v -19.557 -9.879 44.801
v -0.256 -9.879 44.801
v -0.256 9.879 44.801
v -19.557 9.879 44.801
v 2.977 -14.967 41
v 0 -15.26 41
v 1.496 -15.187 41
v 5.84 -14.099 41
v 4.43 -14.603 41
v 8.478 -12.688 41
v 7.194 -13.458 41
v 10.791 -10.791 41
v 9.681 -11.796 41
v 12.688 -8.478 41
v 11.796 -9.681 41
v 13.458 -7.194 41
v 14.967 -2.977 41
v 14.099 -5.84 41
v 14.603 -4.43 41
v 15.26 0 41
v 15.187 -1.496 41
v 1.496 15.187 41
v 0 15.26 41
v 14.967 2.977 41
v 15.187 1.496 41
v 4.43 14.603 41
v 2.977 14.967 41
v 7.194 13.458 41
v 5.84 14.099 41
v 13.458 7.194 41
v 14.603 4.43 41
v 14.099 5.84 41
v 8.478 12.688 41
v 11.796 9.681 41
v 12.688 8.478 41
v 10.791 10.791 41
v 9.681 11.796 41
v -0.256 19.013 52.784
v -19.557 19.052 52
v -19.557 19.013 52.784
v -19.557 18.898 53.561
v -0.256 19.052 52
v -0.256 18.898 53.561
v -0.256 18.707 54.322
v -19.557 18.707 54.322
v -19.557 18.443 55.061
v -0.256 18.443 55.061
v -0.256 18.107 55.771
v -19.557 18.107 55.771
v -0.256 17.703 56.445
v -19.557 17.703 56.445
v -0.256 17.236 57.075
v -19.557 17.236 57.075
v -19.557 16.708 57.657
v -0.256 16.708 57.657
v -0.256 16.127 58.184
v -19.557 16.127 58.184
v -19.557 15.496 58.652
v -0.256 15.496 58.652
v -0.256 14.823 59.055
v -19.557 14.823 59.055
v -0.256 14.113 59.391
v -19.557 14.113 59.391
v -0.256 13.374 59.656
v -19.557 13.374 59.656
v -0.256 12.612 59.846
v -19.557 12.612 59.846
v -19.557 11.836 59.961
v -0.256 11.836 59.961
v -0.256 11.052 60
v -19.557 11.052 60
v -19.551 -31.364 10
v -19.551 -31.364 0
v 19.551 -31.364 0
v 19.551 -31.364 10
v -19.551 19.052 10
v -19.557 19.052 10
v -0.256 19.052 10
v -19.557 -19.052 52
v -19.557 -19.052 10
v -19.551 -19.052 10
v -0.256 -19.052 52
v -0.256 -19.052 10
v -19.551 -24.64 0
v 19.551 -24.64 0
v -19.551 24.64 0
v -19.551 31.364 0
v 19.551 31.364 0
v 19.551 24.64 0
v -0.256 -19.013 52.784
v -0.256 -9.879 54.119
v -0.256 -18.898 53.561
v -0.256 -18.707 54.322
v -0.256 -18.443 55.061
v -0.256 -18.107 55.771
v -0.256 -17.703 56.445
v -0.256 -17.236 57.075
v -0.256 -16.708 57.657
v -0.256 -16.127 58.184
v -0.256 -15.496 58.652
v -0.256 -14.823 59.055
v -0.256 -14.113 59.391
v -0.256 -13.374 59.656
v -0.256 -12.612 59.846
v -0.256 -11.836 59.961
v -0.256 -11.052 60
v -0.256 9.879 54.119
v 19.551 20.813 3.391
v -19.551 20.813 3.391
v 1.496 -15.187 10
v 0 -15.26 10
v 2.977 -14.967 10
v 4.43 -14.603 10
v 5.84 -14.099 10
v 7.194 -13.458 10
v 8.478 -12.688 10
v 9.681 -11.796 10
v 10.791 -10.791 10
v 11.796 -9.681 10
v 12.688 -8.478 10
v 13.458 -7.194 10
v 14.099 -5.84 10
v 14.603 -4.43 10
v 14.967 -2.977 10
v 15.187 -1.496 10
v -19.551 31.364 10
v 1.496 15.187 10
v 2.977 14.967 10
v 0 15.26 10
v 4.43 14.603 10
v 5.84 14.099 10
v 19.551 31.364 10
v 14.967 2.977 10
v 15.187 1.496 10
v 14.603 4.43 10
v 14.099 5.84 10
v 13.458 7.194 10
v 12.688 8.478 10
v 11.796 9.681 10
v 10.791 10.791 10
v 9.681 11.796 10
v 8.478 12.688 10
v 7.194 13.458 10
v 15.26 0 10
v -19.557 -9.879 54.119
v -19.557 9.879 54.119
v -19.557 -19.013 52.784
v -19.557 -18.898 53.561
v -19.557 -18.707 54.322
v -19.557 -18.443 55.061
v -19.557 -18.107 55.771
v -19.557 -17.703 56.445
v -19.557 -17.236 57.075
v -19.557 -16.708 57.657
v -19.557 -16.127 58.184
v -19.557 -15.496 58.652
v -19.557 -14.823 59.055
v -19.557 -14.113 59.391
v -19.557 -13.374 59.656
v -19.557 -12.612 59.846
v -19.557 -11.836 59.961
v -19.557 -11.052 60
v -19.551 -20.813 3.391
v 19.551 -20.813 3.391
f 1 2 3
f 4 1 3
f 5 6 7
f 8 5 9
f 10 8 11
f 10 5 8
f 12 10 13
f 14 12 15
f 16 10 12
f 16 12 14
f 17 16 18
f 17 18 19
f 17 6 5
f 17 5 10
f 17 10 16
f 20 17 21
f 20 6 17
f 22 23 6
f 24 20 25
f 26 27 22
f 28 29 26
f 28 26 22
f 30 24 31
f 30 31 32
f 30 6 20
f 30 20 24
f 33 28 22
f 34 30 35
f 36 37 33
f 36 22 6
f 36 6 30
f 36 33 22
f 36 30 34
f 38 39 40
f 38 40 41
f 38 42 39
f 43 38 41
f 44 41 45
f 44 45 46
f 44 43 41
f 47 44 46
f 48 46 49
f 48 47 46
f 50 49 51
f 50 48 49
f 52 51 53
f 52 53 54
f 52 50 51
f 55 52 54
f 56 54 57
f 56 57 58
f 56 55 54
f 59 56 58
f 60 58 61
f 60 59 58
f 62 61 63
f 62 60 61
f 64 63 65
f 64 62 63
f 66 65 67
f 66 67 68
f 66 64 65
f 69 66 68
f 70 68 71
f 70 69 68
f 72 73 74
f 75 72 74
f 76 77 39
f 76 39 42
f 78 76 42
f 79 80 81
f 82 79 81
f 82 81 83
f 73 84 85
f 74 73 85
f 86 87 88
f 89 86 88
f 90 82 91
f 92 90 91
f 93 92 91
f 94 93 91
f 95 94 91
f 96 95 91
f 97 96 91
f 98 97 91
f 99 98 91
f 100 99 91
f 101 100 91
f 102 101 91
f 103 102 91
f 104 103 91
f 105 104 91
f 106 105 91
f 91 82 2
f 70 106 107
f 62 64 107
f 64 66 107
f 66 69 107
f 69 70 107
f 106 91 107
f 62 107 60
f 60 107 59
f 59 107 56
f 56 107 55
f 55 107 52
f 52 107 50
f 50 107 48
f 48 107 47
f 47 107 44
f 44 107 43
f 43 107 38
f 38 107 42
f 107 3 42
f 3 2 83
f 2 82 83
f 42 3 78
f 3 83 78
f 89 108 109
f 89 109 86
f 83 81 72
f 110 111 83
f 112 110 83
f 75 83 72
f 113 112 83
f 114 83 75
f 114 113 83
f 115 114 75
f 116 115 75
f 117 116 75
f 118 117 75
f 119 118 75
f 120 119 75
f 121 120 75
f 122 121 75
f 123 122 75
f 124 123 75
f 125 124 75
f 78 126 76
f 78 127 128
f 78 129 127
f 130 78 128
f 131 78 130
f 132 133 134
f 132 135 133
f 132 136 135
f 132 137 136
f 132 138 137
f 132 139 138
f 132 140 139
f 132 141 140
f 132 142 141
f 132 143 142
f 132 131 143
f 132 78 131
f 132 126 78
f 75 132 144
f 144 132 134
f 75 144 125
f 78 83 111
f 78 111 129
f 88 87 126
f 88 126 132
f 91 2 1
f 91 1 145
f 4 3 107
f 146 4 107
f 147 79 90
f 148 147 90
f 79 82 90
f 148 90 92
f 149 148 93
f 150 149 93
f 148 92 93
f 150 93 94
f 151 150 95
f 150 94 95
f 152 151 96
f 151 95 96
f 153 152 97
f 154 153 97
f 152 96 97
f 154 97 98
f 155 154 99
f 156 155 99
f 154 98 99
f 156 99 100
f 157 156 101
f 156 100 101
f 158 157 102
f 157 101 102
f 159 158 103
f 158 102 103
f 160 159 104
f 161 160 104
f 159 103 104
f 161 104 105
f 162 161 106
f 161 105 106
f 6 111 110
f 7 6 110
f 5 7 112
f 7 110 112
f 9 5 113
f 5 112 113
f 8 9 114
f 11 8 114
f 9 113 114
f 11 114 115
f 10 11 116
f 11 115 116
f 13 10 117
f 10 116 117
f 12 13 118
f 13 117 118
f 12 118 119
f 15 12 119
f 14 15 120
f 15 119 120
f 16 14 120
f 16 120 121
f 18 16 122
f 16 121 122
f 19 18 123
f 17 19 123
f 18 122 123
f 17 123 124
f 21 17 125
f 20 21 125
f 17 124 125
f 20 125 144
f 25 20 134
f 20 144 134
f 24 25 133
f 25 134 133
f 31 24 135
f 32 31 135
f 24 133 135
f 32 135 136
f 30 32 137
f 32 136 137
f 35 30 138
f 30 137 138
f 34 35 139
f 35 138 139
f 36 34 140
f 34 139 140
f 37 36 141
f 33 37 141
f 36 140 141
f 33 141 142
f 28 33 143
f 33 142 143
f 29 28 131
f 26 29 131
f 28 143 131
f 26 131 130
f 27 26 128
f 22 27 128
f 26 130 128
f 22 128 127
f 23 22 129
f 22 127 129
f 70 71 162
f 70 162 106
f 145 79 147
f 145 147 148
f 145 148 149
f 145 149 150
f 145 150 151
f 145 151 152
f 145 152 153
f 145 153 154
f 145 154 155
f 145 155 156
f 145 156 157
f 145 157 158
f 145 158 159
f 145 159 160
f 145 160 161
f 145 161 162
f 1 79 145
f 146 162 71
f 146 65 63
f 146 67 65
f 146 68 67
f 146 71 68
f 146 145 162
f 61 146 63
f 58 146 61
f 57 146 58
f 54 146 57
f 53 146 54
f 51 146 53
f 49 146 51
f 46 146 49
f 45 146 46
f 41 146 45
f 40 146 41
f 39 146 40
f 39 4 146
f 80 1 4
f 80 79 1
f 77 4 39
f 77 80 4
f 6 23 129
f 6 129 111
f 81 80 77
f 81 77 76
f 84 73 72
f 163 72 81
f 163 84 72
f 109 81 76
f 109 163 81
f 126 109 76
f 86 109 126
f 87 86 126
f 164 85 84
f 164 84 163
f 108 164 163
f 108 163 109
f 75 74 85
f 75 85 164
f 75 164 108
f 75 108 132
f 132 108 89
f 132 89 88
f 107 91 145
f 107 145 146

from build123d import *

# Parameters (mm, degrees)
SKETCH_W        = 39.101506
SKETCH_H        = 62.728786
PAD_DEPTH       = 10
POCKET_DEPTH    = 39.102506
SKETCH002_W     = 19.301168
SKETCH002_H     = 38.103164
PAD001_DEPTH    = 50
FILLET_R        = 8
PAD002_DEPTH    = 31
SKETCH004_W     = 19.757324
SKETCH004_H     = 9.317804
POCKET001_DEPTH = 19.302168


with BuildPart() as part:
    # Sketch → Pad (new body)
    with BuildSketch(Plane.XY):
        Rectangle(SKETCH_W, SKETCH_H)
    extrude(amount=PAD_DEPTH)

    # Sketch001 (on Face3 of Pad) → Pocket (cut, through all)
    with BuildSketch(Plane.YZ.offset(19.550753)):
        Polygon((-24.639747, 0), (-20.812978, 3.391465), (20.812978, 3.391465), (24.639747, 0), align=None)
    extrude(amount=-POCKET_DEPTH, mode=Mode.SUBTRACT)

    # Sketch002 (on Face8 of Pocket) → Pad001 (join)
    with BuildSketch(Plane.XY.offset(10)):
        with Locations((-9.90619, 0)):
            Rectangle(SKETCH002_W, SKETCH002_H)
    extrude(amount=PAD001_DEPTH)

    # Fillet
    fillet_edges = [part.edges().sort_by_distance(p)[0] for p in [
        (-9.90619, -19.051582, 60),
        (-9.90619, 19.051582, 60),
    ]]
    fillet(fillet_edges, radius=FILLET_R)

    # Sketch003 (on Face6 of Fillet) → Pad002 (join)
    with BuildSketch(Plane.XY.offset(10)):
        with BuildLine():
            ThreePointArc((0, -15.260272), (15.260272, 0), (0, 15.260272))
            Line((0, 0), (0, 15.260272))
            Line((0, 0), (0, -15.260272))
        make_face()
    extrude(amount=PAD002_DEPTH)

    # Sketch004 (on Face5 of Pad002) → Pocket001 (cut, through all)
    with BuildSketch(Plane.YZ.offset(-0.255606)):
        with Locations((0, 49.459888)):
            Rectangle(SKETCH004_W, SKETCH004_H)
    extrude(amount=-POCKET001_DEPTH, mode=Mode.SUBTRACT)


solid = part.part
